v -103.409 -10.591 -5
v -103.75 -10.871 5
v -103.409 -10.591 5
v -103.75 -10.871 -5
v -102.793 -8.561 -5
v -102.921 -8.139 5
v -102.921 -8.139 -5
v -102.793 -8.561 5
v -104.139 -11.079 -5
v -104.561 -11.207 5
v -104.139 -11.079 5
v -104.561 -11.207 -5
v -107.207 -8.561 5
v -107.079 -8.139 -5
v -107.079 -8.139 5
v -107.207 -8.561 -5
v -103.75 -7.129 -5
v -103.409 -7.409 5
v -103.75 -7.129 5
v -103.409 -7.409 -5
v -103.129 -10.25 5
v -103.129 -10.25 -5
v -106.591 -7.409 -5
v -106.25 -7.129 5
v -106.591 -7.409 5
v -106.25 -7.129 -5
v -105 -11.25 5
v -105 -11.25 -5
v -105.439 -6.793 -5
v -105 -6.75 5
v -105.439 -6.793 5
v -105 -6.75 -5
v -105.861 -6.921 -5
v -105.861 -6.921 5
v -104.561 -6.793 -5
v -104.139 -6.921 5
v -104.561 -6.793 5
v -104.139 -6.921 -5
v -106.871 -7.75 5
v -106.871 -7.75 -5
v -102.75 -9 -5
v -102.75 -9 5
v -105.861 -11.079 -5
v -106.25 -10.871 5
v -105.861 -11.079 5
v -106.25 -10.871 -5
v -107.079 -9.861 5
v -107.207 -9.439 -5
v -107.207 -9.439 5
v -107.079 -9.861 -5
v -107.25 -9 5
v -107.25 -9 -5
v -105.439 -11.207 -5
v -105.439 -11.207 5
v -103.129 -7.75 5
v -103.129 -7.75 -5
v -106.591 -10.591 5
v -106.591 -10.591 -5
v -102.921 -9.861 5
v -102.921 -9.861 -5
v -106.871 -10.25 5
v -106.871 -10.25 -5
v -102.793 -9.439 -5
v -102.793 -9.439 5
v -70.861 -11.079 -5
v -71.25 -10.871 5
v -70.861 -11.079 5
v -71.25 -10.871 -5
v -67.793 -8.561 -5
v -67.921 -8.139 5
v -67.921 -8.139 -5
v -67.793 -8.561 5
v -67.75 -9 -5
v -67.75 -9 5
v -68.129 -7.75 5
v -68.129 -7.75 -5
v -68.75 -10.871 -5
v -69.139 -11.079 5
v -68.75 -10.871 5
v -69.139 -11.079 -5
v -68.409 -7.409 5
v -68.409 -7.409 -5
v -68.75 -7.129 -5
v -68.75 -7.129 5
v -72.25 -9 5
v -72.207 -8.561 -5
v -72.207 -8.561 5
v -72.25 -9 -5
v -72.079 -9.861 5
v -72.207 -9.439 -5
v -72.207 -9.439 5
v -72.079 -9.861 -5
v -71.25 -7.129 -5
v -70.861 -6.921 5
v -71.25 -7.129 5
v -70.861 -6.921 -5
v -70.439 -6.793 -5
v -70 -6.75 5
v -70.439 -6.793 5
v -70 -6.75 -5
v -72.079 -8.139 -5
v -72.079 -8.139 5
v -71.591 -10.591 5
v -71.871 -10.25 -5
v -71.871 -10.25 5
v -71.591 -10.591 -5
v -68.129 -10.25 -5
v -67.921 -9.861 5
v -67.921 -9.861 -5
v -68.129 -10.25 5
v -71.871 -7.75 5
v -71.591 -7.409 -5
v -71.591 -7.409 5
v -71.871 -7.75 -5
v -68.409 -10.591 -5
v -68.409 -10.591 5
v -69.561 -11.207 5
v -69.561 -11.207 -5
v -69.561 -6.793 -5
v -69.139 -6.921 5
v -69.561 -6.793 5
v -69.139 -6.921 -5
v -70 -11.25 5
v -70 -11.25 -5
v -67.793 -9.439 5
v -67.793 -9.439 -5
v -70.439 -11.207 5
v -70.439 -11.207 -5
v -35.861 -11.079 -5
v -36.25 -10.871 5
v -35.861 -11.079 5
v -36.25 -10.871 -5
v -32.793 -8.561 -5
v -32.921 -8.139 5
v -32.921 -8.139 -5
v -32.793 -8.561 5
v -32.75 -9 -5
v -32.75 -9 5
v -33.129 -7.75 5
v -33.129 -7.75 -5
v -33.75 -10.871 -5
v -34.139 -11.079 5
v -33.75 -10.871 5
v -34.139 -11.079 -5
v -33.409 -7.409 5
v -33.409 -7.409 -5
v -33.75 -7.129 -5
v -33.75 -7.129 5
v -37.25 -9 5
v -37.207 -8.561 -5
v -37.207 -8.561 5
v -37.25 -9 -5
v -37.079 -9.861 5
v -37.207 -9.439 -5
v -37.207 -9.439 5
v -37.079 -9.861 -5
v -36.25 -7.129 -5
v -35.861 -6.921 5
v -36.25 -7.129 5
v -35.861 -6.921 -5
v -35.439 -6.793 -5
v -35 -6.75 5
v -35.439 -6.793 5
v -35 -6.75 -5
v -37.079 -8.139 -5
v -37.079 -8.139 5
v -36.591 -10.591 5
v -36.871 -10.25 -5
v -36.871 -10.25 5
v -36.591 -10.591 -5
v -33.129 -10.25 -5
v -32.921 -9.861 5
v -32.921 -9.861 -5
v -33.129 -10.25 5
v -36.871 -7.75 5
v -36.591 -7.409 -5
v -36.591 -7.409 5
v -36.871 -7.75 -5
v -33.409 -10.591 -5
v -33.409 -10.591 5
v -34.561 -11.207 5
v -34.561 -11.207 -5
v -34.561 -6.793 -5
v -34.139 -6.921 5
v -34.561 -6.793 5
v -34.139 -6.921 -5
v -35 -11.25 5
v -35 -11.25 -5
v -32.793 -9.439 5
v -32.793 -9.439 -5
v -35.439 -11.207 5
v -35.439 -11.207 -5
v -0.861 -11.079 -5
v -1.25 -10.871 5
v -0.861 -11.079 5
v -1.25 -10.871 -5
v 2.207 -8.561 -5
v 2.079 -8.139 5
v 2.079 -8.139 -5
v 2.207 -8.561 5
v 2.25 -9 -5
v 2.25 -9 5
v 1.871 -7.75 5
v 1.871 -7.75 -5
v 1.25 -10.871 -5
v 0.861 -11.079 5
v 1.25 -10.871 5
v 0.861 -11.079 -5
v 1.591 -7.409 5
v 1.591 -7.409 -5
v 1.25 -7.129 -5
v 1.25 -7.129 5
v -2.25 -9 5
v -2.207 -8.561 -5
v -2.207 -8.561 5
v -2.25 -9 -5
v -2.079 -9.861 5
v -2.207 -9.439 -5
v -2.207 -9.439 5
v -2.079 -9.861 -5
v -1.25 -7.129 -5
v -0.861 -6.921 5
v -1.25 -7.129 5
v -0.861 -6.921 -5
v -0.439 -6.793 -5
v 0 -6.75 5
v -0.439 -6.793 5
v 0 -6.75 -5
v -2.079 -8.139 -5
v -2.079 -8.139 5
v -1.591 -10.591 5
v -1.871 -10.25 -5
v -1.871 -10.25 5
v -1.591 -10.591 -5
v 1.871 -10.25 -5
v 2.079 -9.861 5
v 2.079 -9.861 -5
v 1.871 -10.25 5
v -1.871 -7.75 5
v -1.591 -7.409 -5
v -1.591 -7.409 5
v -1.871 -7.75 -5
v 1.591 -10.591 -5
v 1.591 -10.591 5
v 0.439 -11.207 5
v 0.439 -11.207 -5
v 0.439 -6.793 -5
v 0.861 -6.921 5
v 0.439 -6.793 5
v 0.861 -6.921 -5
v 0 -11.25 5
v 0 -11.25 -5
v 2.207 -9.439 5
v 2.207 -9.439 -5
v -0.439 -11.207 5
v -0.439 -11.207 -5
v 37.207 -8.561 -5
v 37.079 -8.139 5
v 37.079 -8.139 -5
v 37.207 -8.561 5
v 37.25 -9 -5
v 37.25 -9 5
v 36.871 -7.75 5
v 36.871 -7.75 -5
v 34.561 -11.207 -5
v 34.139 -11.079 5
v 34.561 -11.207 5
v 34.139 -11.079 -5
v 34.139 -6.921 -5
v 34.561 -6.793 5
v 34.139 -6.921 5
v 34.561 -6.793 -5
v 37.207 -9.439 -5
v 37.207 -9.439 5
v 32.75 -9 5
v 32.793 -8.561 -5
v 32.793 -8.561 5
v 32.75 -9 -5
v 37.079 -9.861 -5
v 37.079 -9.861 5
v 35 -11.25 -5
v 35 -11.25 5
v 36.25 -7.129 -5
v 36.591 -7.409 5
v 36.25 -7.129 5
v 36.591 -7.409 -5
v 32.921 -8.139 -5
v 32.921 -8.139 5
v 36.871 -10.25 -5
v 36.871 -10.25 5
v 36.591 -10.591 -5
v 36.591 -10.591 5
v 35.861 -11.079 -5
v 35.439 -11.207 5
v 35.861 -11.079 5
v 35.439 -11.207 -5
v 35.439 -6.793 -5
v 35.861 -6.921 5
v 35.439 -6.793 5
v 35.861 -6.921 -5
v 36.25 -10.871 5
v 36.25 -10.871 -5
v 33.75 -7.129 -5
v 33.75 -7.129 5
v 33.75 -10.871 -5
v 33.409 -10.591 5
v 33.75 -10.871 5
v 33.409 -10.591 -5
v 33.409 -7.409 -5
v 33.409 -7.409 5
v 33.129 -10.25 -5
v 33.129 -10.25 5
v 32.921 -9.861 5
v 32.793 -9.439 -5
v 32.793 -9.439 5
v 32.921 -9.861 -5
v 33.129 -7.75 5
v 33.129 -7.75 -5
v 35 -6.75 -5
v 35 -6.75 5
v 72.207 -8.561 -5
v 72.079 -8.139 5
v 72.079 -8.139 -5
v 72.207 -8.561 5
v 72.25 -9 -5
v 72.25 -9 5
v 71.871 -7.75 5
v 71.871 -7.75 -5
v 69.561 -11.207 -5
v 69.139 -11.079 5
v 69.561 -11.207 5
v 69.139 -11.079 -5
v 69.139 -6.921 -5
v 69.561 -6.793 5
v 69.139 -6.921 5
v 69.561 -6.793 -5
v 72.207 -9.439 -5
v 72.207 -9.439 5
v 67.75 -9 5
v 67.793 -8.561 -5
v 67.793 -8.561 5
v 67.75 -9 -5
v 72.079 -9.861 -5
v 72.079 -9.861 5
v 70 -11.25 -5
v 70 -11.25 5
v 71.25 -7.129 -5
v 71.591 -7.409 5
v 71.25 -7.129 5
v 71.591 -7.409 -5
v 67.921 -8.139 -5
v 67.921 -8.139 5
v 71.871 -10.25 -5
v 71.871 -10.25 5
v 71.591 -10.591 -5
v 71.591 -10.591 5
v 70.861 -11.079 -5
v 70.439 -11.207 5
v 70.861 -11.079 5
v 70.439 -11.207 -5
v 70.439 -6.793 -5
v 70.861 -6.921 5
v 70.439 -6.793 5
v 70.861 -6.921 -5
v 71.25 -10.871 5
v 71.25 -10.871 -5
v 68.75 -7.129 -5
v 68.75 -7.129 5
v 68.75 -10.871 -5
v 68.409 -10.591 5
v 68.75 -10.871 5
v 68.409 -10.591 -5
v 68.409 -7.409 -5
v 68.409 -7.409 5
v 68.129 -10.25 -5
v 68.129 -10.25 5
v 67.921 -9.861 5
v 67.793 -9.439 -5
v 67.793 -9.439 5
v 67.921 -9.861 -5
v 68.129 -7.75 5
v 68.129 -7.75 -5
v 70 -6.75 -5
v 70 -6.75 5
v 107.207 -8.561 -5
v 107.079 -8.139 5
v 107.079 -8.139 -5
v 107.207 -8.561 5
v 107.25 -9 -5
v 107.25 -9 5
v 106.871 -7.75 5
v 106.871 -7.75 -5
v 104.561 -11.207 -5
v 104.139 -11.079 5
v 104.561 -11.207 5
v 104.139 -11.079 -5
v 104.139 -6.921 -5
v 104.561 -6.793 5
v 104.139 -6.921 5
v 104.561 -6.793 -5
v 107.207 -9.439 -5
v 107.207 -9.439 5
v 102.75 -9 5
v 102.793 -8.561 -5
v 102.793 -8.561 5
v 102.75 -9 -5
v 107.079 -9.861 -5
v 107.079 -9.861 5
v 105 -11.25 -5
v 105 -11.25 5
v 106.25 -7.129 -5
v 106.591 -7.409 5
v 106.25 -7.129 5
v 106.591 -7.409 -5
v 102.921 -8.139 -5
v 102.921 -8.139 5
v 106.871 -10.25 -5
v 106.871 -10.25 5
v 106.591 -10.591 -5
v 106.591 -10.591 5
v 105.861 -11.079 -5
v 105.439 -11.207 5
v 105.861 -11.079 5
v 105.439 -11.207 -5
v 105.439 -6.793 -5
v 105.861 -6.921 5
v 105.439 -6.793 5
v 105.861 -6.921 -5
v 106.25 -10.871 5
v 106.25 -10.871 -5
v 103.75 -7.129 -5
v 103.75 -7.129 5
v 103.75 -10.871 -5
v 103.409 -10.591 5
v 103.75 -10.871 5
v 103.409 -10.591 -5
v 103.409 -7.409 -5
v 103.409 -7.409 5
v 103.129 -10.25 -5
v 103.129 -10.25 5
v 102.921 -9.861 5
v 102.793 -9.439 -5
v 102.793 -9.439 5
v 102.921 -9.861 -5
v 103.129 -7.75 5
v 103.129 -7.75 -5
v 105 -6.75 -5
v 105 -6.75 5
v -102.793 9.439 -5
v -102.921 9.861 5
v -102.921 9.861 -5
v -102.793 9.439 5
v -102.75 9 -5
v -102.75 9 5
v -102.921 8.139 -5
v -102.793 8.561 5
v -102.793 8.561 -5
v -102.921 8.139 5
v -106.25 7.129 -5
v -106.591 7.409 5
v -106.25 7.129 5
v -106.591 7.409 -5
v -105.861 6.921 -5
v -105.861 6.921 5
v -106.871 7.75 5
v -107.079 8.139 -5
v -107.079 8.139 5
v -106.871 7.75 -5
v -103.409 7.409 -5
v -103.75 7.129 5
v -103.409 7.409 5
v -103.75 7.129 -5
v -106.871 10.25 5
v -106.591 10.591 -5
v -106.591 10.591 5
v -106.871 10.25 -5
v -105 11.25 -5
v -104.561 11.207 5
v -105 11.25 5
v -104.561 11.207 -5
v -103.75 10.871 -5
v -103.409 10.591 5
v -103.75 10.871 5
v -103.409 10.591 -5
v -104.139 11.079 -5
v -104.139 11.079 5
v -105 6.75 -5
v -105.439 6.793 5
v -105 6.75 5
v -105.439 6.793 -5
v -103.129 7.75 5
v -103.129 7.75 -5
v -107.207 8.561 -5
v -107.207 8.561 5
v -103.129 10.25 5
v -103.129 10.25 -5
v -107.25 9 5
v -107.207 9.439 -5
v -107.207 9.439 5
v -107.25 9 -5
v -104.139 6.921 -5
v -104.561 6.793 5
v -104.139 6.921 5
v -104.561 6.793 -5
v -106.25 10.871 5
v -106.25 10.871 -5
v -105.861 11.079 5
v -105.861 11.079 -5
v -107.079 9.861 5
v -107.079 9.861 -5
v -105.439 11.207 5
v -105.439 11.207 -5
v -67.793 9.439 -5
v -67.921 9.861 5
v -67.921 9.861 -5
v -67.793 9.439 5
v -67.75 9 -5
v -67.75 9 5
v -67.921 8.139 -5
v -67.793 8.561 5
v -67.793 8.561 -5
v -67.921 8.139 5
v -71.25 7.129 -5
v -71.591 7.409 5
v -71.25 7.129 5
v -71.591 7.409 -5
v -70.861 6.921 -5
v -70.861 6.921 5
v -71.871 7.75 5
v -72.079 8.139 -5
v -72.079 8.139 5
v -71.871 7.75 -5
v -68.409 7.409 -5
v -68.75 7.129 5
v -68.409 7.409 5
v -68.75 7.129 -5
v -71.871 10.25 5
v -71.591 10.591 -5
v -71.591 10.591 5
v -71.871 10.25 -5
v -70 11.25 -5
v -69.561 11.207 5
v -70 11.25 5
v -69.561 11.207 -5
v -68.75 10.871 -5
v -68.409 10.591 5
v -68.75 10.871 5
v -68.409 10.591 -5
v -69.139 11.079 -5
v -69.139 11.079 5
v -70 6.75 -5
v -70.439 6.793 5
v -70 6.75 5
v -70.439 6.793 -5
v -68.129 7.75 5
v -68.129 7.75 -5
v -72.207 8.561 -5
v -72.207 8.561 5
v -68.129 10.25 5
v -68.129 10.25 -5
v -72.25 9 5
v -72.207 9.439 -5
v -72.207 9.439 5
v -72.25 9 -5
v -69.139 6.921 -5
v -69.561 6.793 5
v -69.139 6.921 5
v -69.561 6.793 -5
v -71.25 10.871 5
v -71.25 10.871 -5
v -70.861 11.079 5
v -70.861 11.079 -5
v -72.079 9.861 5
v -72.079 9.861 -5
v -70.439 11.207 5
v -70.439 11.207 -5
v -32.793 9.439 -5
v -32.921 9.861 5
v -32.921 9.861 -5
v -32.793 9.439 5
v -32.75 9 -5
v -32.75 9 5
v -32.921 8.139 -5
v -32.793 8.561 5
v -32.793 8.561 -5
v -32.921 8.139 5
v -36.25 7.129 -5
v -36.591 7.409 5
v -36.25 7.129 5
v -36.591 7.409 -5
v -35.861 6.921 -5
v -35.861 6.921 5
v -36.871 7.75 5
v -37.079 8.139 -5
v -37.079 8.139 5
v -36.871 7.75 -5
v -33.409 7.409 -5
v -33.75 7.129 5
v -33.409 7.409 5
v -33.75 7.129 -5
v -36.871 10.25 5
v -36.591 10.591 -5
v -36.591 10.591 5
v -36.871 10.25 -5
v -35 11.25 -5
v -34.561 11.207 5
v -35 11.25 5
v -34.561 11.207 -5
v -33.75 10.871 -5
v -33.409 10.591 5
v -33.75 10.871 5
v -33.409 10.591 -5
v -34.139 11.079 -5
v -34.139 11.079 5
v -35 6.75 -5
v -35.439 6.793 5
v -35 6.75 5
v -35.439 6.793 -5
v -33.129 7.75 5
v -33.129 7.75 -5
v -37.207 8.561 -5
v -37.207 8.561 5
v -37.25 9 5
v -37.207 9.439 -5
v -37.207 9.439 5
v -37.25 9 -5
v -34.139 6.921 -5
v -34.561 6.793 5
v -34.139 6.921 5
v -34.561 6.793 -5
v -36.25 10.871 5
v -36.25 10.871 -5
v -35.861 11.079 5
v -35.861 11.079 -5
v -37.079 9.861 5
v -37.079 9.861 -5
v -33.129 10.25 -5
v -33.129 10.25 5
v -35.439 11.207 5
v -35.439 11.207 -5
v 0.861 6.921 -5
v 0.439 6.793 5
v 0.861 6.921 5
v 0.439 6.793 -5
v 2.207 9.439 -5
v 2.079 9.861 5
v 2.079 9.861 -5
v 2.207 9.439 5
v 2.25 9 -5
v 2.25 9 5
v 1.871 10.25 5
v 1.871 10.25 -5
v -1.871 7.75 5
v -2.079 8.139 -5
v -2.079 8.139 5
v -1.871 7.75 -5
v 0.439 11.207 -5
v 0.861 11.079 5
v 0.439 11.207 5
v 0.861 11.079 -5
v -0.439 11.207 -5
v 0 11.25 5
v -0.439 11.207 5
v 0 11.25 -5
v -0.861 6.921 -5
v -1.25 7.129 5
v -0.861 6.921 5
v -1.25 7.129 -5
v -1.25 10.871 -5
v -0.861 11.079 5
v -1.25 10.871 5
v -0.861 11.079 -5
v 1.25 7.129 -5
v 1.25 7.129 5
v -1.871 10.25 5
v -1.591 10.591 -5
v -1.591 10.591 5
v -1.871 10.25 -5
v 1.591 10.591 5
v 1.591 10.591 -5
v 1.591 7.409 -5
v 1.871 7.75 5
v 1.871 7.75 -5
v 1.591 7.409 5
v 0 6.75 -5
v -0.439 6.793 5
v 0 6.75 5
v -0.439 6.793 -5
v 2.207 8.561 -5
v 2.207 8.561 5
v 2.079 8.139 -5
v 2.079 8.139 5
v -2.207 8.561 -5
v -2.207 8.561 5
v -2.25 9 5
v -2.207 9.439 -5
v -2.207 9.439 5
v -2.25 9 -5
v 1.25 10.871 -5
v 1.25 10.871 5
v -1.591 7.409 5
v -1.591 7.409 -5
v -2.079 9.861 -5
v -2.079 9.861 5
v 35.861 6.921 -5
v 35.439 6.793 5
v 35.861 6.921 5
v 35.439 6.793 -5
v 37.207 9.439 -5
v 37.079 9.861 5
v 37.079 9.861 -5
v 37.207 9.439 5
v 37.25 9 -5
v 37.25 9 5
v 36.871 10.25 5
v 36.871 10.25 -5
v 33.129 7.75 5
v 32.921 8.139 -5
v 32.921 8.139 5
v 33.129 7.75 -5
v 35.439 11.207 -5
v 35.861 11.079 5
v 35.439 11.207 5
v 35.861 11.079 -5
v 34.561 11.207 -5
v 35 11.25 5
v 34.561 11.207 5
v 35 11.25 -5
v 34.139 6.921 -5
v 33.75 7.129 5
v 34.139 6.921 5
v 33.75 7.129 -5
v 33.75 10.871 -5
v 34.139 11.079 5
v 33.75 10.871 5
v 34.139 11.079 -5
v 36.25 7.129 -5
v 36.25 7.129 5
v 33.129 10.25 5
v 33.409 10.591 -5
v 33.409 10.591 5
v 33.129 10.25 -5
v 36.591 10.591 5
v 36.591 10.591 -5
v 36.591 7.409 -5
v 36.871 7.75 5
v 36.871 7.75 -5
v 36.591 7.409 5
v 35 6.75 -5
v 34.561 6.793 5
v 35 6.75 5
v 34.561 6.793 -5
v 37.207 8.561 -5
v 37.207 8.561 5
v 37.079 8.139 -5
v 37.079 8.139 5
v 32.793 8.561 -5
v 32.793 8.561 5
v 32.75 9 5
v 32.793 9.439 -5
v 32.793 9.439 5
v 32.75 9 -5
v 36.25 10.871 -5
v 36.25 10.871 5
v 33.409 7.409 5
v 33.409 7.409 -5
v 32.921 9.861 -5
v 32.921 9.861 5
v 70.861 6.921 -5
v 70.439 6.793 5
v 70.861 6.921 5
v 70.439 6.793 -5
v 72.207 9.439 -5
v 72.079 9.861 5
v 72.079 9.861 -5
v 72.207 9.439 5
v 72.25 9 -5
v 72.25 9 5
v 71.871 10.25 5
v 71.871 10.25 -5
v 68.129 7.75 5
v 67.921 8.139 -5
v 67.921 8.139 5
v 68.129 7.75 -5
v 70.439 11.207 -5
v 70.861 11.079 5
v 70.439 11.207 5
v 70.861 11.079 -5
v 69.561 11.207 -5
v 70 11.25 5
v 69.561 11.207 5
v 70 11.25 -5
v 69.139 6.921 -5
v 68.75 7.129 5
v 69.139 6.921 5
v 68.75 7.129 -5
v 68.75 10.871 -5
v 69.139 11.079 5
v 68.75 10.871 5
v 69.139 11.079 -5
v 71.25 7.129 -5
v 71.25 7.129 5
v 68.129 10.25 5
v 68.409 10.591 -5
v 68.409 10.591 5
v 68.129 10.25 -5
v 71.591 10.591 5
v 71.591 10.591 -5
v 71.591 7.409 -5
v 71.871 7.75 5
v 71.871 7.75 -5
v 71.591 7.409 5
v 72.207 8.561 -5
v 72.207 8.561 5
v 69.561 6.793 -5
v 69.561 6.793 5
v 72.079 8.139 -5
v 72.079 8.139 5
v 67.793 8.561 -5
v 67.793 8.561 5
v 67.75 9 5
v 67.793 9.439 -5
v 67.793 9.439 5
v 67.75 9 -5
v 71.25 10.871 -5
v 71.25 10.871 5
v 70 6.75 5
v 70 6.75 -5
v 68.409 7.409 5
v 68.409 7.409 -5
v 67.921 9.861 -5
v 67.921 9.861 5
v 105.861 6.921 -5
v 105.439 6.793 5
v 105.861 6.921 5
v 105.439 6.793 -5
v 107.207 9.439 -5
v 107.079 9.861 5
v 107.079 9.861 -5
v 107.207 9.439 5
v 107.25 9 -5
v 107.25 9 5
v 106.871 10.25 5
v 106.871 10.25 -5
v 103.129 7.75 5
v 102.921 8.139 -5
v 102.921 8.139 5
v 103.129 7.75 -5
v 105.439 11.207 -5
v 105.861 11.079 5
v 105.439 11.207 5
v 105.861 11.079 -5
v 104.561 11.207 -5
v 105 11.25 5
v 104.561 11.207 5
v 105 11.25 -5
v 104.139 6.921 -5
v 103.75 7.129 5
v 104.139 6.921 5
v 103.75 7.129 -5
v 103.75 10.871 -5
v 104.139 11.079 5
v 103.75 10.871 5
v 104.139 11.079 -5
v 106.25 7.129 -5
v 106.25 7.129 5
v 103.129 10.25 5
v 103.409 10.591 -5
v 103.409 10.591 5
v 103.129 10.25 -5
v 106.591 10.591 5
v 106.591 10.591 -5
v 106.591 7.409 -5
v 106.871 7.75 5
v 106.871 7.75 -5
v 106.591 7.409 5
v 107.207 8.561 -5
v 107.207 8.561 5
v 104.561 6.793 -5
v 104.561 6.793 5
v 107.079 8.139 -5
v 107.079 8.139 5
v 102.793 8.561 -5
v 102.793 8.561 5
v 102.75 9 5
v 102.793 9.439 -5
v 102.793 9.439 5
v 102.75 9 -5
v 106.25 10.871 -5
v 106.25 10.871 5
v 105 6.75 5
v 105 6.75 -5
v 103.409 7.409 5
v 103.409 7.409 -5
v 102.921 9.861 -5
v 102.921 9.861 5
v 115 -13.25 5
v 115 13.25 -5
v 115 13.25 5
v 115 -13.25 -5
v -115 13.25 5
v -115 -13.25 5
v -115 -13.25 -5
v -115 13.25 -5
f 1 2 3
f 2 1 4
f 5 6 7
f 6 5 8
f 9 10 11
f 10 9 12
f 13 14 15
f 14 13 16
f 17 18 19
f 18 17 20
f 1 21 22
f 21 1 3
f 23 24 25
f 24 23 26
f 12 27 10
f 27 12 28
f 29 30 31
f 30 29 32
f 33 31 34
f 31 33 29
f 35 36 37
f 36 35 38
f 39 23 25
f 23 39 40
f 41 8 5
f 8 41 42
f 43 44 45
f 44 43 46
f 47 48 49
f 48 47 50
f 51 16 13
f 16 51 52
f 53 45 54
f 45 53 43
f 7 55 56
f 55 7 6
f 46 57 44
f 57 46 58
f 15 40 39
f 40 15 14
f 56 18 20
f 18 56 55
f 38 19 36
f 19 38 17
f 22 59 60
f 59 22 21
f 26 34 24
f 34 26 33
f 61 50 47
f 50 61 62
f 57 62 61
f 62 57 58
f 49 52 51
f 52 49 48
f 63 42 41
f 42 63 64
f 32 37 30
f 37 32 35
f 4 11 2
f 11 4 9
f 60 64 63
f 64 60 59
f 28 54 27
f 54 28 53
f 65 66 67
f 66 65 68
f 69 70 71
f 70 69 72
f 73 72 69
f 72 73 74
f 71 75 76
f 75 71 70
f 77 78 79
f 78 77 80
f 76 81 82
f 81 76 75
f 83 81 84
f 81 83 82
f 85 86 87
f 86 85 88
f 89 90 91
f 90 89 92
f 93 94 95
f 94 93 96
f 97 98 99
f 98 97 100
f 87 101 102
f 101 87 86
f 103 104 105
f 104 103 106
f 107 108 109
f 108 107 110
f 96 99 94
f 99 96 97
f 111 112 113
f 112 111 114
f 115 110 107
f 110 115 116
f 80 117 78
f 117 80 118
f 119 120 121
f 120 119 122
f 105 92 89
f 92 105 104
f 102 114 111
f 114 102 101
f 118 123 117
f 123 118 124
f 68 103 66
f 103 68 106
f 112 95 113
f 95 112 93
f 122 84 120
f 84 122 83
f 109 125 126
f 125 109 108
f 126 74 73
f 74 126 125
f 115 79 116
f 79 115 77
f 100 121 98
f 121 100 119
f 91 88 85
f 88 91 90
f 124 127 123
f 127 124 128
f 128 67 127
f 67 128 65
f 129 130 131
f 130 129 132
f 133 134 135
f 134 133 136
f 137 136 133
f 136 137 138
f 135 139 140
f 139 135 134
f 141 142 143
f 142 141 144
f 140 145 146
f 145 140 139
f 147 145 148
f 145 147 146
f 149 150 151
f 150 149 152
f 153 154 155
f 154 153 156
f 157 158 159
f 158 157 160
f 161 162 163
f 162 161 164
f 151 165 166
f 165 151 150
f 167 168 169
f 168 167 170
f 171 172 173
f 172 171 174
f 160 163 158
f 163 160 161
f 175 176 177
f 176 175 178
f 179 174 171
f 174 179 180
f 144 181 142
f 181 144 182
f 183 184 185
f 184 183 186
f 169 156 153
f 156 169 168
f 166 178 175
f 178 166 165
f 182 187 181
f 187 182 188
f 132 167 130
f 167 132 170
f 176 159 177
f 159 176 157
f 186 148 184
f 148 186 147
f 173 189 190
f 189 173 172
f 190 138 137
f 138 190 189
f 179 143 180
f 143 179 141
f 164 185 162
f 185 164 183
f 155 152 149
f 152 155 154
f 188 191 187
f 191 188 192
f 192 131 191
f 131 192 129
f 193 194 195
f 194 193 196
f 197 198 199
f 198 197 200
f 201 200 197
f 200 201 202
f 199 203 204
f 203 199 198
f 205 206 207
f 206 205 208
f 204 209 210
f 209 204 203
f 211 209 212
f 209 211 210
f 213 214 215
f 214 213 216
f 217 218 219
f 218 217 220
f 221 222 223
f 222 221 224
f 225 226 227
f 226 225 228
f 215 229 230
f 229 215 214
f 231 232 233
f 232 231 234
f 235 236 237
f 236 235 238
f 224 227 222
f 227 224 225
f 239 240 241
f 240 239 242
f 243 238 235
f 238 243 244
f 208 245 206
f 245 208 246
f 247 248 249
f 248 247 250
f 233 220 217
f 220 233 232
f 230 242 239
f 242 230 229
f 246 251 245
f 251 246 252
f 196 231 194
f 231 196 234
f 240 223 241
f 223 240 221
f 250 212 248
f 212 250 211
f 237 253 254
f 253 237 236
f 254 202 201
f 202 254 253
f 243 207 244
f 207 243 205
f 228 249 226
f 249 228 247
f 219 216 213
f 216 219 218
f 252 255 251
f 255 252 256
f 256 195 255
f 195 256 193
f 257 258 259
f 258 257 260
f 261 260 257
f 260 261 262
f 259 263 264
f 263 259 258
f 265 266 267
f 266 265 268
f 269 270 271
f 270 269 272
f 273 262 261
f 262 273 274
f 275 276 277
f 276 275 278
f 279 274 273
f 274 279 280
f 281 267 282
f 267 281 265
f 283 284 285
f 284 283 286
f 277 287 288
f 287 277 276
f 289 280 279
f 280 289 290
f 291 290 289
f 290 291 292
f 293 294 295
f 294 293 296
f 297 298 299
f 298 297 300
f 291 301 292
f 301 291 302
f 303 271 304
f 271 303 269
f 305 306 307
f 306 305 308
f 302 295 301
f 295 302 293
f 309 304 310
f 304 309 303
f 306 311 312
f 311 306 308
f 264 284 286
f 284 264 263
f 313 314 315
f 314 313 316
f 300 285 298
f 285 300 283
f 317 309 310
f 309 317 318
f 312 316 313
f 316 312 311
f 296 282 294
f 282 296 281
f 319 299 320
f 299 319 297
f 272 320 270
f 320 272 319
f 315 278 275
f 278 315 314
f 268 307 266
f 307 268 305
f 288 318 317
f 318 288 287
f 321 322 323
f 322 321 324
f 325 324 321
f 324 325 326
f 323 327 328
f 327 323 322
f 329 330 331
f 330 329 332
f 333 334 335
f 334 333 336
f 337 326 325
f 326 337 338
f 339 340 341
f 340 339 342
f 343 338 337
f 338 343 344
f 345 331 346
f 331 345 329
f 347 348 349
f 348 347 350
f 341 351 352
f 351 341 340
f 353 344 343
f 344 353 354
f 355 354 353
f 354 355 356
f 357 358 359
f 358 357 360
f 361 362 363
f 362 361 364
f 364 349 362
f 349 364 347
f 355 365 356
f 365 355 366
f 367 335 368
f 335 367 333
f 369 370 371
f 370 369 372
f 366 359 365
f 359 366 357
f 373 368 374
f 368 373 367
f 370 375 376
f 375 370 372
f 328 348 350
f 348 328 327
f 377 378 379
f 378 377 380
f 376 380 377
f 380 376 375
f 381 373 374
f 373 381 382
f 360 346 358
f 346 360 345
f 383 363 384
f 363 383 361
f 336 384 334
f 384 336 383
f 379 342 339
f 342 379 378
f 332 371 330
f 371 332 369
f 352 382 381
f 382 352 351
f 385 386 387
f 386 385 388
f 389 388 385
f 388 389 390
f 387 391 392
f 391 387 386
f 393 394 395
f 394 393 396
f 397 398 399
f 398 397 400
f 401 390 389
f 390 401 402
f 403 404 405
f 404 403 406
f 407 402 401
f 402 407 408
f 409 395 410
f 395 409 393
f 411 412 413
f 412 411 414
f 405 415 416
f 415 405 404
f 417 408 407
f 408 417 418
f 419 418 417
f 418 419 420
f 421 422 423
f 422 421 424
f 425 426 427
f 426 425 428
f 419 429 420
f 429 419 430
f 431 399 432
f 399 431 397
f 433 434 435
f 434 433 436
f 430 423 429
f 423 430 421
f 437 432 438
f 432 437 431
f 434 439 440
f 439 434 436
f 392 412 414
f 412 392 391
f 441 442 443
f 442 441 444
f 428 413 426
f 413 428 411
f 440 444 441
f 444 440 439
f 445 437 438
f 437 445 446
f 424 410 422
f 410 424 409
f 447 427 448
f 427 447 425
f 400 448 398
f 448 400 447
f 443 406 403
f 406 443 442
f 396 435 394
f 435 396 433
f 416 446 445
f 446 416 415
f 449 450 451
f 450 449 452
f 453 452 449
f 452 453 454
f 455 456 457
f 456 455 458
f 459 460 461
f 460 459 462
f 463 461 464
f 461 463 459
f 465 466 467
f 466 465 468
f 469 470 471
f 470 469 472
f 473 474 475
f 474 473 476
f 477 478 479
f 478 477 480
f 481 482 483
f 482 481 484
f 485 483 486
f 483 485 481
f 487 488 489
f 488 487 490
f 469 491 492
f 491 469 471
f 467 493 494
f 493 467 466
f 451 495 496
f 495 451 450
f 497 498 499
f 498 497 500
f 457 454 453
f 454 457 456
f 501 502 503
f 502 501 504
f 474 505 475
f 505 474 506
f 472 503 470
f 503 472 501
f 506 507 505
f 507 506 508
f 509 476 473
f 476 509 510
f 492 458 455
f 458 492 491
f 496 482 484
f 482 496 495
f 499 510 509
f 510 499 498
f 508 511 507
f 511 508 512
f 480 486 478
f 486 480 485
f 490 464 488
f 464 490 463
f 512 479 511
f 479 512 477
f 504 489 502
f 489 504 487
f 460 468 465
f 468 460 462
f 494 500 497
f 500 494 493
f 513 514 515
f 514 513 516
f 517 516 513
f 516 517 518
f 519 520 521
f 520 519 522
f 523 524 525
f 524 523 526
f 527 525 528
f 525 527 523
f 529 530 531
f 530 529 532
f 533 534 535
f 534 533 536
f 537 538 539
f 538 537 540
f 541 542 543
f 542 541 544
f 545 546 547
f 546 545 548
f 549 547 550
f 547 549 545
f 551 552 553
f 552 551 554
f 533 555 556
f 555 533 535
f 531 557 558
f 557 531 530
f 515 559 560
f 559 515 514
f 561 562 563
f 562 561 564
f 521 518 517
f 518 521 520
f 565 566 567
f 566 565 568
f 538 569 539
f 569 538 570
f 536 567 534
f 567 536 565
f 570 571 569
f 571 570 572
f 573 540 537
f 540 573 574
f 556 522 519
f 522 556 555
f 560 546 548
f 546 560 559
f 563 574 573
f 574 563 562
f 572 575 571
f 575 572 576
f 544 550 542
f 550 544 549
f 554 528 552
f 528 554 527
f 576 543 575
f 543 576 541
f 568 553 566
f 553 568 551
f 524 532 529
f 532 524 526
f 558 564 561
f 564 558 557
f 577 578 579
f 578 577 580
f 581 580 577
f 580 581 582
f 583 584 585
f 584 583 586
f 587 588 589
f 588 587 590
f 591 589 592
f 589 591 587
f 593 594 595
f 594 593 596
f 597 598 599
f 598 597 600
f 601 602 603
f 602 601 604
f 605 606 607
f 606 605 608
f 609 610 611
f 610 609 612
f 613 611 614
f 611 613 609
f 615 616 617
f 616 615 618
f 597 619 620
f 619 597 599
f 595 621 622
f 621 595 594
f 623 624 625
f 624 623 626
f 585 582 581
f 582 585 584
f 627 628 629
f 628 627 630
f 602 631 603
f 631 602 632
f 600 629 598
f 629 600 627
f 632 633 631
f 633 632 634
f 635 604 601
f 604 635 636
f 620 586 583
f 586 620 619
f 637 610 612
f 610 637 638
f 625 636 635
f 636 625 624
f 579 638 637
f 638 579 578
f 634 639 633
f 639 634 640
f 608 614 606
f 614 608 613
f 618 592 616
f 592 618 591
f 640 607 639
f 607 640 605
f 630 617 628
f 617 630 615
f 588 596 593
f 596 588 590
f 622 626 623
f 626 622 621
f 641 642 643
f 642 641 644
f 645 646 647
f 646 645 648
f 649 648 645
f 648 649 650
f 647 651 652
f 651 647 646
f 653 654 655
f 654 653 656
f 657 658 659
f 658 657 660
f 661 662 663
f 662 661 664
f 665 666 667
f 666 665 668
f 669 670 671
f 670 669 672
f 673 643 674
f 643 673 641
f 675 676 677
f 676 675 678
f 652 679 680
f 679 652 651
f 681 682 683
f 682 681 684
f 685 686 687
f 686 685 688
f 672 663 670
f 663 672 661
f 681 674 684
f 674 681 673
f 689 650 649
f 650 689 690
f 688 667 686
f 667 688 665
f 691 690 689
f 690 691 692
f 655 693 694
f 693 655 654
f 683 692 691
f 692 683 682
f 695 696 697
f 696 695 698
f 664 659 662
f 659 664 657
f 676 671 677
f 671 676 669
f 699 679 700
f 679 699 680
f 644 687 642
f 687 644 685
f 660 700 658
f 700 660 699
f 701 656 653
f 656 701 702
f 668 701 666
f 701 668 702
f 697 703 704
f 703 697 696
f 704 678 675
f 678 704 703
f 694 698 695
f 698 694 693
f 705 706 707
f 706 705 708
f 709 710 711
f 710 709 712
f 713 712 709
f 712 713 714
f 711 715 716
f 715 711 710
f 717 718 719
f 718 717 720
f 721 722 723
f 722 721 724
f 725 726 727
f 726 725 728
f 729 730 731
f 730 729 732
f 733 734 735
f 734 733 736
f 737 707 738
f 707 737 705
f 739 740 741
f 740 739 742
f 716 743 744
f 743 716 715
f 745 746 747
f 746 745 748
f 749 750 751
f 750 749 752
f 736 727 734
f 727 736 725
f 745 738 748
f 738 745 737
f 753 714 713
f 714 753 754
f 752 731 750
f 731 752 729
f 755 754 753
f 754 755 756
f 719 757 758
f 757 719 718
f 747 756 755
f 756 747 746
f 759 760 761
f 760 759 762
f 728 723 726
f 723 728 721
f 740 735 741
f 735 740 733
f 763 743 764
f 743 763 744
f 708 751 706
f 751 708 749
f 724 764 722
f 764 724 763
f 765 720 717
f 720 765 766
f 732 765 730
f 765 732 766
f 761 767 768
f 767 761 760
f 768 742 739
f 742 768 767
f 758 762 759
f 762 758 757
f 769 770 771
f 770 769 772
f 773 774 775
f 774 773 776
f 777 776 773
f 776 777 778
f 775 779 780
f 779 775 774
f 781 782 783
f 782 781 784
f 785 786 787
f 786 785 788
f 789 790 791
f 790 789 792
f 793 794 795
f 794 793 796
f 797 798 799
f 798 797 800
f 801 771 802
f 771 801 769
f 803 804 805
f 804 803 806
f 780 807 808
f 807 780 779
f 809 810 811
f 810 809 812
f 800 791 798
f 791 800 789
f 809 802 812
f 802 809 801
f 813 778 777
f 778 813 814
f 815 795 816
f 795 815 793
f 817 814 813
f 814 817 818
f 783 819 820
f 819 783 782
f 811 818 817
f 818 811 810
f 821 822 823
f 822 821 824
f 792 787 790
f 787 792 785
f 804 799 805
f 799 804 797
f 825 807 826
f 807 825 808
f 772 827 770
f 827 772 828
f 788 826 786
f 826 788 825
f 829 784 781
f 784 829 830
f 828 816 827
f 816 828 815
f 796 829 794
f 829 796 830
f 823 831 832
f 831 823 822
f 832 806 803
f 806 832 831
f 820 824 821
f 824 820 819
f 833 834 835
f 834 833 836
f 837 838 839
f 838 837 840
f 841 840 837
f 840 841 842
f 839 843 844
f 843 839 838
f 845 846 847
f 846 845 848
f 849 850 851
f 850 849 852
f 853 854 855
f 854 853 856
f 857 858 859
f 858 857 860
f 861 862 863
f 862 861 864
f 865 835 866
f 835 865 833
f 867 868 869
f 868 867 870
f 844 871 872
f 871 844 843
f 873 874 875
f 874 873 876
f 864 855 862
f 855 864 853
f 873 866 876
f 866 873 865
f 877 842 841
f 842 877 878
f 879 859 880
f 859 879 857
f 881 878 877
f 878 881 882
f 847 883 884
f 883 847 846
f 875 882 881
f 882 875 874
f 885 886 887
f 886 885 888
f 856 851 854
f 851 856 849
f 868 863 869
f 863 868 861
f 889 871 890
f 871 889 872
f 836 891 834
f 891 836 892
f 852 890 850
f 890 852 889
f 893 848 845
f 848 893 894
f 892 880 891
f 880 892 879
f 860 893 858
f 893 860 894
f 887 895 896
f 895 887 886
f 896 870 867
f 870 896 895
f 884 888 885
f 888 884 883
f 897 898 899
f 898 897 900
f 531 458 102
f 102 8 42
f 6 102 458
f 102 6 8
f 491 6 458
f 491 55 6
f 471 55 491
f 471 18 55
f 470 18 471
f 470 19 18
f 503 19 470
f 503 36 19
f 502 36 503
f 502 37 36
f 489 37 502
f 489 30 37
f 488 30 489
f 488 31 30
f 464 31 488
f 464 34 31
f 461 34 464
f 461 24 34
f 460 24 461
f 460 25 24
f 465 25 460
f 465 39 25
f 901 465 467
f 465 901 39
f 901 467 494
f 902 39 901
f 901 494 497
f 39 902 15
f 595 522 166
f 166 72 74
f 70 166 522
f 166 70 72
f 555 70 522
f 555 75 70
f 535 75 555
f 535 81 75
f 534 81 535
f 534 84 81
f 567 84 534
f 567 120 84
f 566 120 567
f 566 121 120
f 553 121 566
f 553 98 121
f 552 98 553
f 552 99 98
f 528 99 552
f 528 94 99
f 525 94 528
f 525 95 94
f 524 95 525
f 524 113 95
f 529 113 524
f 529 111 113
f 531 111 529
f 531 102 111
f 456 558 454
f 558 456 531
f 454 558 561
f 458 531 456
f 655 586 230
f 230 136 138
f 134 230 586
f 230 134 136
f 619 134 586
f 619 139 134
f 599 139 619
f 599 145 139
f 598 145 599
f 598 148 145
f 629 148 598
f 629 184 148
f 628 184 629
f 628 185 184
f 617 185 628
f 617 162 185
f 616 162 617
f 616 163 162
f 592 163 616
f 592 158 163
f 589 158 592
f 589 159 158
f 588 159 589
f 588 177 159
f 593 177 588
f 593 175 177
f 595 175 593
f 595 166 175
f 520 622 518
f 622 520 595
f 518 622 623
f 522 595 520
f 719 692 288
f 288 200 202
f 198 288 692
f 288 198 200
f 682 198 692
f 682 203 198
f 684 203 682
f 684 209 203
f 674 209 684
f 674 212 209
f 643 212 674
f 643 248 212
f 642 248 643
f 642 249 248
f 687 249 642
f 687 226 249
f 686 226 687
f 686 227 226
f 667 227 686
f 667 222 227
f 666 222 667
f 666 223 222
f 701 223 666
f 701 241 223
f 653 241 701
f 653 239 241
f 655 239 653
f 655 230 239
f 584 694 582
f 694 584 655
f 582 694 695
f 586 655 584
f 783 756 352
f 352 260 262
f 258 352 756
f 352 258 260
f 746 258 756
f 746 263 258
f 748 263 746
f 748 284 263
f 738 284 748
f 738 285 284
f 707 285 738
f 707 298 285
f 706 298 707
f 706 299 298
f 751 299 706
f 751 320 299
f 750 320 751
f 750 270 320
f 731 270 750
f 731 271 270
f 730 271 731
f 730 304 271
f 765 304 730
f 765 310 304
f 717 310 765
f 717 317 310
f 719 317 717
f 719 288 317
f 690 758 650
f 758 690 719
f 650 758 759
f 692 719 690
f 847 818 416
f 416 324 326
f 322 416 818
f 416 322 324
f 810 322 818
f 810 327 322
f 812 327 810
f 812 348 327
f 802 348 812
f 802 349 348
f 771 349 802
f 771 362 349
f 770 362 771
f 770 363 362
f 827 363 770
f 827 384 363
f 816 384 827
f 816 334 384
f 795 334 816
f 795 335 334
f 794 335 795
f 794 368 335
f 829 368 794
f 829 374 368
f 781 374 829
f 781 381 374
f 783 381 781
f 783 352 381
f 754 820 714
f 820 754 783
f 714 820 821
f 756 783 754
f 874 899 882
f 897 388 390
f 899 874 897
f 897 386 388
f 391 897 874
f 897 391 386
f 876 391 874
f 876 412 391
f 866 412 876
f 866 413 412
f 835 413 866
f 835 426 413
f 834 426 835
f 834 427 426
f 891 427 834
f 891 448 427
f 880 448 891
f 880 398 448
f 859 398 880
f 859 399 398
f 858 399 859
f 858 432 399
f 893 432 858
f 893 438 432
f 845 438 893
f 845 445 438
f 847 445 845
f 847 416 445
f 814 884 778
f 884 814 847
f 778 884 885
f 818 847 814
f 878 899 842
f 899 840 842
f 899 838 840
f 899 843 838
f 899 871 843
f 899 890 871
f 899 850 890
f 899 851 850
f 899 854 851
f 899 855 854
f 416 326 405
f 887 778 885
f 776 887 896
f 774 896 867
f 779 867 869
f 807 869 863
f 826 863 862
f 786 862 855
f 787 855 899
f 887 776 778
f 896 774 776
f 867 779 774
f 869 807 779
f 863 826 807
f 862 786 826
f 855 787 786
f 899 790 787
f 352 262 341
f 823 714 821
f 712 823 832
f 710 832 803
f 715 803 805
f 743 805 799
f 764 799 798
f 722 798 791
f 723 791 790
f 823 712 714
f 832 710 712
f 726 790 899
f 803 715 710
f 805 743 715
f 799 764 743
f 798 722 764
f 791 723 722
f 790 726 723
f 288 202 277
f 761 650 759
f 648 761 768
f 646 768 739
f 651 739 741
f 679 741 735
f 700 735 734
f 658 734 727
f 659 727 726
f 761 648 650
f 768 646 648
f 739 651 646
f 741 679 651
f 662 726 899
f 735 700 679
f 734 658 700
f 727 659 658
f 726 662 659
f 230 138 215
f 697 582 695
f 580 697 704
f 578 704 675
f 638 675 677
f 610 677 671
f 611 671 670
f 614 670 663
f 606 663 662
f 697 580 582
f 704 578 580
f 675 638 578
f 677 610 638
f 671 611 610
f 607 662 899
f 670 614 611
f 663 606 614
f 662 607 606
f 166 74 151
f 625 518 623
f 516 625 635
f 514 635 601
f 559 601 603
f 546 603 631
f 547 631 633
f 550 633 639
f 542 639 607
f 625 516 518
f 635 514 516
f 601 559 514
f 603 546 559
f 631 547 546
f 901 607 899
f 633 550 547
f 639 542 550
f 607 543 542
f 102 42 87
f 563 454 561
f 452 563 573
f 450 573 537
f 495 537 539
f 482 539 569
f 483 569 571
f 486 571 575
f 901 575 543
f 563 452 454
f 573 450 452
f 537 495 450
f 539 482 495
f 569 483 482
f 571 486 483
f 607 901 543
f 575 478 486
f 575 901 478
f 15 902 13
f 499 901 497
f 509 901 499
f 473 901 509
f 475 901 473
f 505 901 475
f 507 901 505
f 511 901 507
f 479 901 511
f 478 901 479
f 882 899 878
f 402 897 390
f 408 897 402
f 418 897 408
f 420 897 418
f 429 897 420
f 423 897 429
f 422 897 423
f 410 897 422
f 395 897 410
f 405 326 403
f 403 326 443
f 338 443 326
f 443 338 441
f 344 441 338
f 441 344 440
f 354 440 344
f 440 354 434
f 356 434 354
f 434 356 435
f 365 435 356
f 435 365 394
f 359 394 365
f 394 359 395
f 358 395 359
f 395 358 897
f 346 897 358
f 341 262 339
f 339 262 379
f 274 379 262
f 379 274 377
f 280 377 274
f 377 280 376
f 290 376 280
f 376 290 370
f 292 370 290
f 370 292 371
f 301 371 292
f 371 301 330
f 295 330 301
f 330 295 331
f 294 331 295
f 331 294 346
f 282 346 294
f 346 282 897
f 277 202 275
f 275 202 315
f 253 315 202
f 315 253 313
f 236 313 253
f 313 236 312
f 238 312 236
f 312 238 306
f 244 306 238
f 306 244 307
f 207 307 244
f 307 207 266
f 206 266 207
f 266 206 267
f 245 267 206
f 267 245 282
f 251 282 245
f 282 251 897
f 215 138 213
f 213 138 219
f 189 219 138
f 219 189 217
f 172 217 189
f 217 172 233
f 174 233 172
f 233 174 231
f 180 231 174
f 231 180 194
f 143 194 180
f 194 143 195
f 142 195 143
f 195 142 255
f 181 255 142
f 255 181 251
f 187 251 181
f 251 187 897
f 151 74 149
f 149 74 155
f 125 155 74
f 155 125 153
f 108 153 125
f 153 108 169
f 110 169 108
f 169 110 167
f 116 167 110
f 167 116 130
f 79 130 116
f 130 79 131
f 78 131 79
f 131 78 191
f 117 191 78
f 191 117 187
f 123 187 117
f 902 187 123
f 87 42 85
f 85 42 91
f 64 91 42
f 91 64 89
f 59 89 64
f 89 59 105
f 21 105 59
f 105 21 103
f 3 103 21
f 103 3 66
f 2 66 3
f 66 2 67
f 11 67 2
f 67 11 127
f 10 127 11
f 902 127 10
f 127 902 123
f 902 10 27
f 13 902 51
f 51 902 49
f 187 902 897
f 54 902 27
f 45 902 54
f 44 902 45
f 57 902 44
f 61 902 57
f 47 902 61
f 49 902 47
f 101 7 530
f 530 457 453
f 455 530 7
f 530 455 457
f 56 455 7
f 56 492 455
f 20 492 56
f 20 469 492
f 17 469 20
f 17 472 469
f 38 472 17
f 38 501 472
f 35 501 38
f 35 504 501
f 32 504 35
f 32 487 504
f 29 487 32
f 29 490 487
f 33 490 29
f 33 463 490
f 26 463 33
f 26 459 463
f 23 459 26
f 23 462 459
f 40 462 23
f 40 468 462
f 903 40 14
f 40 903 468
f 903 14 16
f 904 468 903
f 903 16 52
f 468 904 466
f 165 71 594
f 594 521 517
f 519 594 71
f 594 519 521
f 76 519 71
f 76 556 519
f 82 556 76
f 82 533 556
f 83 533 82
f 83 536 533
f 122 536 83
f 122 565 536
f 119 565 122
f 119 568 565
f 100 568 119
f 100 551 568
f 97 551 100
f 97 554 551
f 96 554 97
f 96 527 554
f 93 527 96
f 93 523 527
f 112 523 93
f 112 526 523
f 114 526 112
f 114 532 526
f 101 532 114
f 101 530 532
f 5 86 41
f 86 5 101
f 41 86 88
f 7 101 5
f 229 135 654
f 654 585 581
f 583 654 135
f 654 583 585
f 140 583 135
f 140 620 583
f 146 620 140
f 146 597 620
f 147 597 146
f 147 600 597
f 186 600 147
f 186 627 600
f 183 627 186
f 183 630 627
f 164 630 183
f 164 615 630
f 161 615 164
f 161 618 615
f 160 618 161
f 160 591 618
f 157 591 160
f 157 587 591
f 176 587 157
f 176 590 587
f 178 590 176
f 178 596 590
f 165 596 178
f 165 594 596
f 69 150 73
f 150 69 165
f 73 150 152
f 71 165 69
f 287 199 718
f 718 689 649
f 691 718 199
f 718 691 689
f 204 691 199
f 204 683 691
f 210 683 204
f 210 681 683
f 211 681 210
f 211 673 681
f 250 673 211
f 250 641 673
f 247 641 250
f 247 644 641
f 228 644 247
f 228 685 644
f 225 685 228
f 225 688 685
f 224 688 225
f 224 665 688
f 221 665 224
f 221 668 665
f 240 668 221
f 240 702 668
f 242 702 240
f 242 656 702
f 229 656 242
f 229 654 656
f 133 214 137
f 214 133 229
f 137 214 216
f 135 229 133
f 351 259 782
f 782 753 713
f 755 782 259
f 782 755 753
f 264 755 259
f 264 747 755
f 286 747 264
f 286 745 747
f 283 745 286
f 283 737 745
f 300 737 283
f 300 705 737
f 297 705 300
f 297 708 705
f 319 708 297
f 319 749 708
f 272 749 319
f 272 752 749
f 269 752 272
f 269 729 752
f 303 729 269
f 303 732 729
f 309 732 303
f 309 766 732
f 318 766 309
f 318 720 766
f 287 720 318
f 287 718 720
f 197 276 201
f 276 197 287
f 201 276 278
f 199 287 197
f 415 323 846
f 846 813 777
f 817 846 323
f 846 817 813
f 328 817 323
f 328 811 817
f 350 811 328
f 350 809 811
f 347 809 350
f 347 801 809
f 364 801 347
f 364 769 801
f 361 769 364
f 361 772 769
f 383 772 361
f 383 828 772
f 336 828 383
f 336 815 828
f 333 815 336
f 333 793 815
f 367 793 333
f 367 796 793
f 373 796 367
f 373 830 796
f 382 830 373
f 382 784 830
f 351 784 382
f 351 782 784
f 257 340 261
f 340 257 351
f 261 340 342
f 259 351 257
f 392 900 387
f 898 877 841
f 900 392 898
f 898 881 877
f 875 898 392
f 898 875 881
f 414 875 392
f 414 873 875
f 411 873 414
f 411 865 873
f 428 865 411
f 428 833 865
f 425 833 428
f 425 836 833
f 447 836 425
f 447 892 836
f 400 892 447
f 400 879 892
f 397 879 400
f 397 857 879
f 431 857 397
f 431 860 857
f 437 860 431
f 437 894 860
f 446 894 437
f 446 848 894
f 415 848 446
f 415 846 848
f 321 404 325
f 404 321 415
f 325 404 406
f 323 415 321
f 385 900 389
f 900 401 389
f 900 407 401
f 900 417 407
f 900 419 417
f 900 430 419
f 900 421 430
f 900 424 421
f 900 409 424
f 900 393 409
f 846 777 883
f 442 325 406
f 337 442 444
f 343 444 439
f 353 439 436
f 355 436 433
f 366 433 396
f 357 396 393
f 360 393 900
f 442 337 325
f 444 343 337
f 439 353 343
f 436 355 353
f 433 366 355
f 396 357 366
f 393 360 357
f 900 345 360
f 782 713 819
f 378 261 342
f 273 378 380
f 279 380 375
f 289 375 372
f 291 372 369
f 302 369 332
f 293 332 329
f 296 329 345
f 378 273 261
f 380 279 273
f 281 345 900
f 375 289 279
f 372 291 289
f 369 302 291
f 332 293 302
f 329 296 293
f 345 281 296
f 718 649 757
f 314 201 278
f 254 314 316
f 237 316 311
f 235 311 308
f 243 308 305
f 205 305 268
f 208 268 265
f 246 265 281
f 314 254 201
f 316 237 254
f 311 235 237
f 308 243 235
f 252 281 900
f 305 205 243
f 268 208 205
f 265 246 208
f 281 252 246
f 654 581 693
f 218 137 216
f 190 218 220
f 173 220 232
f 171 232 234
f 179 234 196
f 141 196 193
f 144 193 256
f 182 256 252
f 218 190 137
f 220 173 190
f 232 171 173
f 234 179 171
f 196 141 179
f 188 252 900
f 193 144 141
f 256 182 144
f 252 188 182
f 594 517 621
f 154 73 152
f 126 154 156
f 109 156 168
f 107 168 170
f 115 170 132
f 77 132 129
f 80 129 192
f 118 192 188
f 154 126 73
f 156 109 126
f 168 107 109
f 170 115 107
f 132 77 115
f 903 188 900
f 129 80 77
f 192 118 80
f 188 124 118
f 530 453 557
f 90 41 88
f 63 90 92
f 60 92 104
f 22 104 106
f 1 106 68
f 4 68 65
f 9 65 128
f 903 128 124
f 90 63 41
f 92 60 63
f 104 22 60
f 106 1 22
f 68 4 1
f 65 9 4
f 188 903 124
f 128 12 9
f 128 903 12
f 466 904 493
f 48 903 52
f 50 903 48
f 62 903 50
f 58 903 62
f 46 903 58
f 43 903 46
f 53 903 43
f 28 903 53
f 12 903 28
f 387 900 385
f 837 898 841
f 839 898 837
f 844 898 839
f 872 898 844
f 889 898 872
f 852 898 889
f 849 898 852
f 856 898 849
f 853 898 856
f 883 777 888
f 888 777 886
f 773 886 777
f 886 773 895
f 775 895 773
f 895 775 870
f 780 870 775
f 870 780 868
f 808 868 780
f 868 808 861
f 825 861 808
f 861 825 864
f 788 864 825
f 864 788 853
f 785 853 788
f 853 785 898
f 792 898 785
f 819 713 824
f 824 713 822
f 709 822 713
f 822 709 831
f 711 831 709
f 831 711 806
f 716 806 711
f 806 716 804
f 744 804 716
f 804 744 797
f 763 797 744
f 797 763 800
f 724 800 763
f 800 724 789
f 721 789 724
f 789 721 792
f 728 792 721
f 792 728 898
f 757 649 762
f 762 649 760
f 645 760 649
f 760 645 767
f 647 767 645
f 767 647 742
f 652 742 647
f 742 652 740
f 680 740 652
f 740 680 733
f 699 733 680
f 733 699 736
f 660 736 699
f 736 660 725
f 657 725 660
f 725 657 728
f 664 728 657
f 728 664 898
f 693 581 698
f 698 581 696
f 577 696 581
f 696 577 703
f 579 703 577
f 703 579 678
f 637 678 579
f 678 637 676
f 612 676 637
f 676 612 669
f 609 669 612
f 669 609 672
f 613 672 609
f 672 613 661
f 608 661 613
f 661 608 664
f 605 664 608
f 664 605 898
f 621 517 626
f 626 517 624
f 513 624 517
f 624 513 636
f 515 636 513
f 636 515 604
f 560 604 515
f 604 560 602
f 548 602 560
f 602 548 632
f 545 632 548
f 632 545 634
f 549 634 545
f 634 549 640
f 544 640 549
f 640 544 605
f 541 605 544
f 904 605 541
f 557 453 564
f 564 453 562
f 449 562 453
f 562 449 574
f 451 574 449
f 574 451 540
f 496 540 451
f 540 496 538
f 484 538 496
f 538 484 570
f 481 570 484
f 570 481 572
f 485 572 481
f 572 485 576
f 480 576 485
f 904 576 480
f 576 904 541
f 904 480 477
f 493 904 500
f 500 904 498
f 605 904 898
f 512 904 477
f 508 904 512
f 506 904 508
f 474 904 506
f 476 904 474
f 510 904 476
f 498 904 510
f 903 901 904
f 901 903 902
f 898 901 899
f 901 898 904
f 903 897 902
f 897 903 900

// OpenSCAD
$fn = 32;

// ----------------------------------------------------------------------
// Hole bar, 7 x Ø4.5
// tworows layout, 10 mm edge offset
// ----------------------------------------------------------------------

// --- parameters (mm) ---
bar_w = 26.5;     // bar width (Y)
bar_t = 10;       // bar thickness (Z)
holes = 7;        // holes per row
hole_d = 4.5;     // hole diameter
edge = 10;        // offset from the bar end to the first hole
pitch = 35;       // pitch between neighbouring holes
row_offset = 18;  // distance between the two rows

// --- derived feature positions (mm) ---
span = (holes - 1) * pitch;   // = 210   distance between the end holes
bar_l = span + 2 * edge;      // = 230   overall bar length
start_x = -bar_l / 2 + edge;  // = -105   X of the first hole
feature_centers = [
  [start_x + 0 * pitch, -row_offset / 2],
  [start_x + 1 * pitch, -row_offset / 2],
  [start_x + 2 * pitch, -row_offset / 2],
  [start_x + 3 * pitch, -row_offset / 2],
  [start_x + 4 * pitch, -row_offset / 2],
  [start_x + 5 * pitch, -row_offset / 2],
  [start_x + 6 * pitch, -row_offset / 2]
];   // hole centres of the first row
row2_centers = [
  [start_x + 0 * pitch, row_offset / 2],
  [start_x + 1 * pitch, row_offset / 2],
  [start_x + 2 * pitch, row_offset / 2],
  [start_x + 3 * pitch, row_offset / 2],
  [start_x + 4 * pitch, row_offset / 2],
  [start_x + 5 * pitch, row_offset / 2],
  [start_x + 6 * pitch, row_offset / 2]
];   // hole centres of the second row

// bar with two rows of holes, both read from their own centre arrays
difference() {
  translate([-bar_l / 2, -bar_w / 2, -bar_t / 2]) cube([bar_l, bar_w, bar_t]);
  for (centre = feature_centers)
    translate([centre[0], centre[1], 0])
      cylinder(d = hole_d, h = bar_t + 2, center = true);
  for (centre = row2_centers)
    translate([centre[0], centre[1], 0])
      cylinder(d = hole_d, h = bar_t + 2, center = true);
}
